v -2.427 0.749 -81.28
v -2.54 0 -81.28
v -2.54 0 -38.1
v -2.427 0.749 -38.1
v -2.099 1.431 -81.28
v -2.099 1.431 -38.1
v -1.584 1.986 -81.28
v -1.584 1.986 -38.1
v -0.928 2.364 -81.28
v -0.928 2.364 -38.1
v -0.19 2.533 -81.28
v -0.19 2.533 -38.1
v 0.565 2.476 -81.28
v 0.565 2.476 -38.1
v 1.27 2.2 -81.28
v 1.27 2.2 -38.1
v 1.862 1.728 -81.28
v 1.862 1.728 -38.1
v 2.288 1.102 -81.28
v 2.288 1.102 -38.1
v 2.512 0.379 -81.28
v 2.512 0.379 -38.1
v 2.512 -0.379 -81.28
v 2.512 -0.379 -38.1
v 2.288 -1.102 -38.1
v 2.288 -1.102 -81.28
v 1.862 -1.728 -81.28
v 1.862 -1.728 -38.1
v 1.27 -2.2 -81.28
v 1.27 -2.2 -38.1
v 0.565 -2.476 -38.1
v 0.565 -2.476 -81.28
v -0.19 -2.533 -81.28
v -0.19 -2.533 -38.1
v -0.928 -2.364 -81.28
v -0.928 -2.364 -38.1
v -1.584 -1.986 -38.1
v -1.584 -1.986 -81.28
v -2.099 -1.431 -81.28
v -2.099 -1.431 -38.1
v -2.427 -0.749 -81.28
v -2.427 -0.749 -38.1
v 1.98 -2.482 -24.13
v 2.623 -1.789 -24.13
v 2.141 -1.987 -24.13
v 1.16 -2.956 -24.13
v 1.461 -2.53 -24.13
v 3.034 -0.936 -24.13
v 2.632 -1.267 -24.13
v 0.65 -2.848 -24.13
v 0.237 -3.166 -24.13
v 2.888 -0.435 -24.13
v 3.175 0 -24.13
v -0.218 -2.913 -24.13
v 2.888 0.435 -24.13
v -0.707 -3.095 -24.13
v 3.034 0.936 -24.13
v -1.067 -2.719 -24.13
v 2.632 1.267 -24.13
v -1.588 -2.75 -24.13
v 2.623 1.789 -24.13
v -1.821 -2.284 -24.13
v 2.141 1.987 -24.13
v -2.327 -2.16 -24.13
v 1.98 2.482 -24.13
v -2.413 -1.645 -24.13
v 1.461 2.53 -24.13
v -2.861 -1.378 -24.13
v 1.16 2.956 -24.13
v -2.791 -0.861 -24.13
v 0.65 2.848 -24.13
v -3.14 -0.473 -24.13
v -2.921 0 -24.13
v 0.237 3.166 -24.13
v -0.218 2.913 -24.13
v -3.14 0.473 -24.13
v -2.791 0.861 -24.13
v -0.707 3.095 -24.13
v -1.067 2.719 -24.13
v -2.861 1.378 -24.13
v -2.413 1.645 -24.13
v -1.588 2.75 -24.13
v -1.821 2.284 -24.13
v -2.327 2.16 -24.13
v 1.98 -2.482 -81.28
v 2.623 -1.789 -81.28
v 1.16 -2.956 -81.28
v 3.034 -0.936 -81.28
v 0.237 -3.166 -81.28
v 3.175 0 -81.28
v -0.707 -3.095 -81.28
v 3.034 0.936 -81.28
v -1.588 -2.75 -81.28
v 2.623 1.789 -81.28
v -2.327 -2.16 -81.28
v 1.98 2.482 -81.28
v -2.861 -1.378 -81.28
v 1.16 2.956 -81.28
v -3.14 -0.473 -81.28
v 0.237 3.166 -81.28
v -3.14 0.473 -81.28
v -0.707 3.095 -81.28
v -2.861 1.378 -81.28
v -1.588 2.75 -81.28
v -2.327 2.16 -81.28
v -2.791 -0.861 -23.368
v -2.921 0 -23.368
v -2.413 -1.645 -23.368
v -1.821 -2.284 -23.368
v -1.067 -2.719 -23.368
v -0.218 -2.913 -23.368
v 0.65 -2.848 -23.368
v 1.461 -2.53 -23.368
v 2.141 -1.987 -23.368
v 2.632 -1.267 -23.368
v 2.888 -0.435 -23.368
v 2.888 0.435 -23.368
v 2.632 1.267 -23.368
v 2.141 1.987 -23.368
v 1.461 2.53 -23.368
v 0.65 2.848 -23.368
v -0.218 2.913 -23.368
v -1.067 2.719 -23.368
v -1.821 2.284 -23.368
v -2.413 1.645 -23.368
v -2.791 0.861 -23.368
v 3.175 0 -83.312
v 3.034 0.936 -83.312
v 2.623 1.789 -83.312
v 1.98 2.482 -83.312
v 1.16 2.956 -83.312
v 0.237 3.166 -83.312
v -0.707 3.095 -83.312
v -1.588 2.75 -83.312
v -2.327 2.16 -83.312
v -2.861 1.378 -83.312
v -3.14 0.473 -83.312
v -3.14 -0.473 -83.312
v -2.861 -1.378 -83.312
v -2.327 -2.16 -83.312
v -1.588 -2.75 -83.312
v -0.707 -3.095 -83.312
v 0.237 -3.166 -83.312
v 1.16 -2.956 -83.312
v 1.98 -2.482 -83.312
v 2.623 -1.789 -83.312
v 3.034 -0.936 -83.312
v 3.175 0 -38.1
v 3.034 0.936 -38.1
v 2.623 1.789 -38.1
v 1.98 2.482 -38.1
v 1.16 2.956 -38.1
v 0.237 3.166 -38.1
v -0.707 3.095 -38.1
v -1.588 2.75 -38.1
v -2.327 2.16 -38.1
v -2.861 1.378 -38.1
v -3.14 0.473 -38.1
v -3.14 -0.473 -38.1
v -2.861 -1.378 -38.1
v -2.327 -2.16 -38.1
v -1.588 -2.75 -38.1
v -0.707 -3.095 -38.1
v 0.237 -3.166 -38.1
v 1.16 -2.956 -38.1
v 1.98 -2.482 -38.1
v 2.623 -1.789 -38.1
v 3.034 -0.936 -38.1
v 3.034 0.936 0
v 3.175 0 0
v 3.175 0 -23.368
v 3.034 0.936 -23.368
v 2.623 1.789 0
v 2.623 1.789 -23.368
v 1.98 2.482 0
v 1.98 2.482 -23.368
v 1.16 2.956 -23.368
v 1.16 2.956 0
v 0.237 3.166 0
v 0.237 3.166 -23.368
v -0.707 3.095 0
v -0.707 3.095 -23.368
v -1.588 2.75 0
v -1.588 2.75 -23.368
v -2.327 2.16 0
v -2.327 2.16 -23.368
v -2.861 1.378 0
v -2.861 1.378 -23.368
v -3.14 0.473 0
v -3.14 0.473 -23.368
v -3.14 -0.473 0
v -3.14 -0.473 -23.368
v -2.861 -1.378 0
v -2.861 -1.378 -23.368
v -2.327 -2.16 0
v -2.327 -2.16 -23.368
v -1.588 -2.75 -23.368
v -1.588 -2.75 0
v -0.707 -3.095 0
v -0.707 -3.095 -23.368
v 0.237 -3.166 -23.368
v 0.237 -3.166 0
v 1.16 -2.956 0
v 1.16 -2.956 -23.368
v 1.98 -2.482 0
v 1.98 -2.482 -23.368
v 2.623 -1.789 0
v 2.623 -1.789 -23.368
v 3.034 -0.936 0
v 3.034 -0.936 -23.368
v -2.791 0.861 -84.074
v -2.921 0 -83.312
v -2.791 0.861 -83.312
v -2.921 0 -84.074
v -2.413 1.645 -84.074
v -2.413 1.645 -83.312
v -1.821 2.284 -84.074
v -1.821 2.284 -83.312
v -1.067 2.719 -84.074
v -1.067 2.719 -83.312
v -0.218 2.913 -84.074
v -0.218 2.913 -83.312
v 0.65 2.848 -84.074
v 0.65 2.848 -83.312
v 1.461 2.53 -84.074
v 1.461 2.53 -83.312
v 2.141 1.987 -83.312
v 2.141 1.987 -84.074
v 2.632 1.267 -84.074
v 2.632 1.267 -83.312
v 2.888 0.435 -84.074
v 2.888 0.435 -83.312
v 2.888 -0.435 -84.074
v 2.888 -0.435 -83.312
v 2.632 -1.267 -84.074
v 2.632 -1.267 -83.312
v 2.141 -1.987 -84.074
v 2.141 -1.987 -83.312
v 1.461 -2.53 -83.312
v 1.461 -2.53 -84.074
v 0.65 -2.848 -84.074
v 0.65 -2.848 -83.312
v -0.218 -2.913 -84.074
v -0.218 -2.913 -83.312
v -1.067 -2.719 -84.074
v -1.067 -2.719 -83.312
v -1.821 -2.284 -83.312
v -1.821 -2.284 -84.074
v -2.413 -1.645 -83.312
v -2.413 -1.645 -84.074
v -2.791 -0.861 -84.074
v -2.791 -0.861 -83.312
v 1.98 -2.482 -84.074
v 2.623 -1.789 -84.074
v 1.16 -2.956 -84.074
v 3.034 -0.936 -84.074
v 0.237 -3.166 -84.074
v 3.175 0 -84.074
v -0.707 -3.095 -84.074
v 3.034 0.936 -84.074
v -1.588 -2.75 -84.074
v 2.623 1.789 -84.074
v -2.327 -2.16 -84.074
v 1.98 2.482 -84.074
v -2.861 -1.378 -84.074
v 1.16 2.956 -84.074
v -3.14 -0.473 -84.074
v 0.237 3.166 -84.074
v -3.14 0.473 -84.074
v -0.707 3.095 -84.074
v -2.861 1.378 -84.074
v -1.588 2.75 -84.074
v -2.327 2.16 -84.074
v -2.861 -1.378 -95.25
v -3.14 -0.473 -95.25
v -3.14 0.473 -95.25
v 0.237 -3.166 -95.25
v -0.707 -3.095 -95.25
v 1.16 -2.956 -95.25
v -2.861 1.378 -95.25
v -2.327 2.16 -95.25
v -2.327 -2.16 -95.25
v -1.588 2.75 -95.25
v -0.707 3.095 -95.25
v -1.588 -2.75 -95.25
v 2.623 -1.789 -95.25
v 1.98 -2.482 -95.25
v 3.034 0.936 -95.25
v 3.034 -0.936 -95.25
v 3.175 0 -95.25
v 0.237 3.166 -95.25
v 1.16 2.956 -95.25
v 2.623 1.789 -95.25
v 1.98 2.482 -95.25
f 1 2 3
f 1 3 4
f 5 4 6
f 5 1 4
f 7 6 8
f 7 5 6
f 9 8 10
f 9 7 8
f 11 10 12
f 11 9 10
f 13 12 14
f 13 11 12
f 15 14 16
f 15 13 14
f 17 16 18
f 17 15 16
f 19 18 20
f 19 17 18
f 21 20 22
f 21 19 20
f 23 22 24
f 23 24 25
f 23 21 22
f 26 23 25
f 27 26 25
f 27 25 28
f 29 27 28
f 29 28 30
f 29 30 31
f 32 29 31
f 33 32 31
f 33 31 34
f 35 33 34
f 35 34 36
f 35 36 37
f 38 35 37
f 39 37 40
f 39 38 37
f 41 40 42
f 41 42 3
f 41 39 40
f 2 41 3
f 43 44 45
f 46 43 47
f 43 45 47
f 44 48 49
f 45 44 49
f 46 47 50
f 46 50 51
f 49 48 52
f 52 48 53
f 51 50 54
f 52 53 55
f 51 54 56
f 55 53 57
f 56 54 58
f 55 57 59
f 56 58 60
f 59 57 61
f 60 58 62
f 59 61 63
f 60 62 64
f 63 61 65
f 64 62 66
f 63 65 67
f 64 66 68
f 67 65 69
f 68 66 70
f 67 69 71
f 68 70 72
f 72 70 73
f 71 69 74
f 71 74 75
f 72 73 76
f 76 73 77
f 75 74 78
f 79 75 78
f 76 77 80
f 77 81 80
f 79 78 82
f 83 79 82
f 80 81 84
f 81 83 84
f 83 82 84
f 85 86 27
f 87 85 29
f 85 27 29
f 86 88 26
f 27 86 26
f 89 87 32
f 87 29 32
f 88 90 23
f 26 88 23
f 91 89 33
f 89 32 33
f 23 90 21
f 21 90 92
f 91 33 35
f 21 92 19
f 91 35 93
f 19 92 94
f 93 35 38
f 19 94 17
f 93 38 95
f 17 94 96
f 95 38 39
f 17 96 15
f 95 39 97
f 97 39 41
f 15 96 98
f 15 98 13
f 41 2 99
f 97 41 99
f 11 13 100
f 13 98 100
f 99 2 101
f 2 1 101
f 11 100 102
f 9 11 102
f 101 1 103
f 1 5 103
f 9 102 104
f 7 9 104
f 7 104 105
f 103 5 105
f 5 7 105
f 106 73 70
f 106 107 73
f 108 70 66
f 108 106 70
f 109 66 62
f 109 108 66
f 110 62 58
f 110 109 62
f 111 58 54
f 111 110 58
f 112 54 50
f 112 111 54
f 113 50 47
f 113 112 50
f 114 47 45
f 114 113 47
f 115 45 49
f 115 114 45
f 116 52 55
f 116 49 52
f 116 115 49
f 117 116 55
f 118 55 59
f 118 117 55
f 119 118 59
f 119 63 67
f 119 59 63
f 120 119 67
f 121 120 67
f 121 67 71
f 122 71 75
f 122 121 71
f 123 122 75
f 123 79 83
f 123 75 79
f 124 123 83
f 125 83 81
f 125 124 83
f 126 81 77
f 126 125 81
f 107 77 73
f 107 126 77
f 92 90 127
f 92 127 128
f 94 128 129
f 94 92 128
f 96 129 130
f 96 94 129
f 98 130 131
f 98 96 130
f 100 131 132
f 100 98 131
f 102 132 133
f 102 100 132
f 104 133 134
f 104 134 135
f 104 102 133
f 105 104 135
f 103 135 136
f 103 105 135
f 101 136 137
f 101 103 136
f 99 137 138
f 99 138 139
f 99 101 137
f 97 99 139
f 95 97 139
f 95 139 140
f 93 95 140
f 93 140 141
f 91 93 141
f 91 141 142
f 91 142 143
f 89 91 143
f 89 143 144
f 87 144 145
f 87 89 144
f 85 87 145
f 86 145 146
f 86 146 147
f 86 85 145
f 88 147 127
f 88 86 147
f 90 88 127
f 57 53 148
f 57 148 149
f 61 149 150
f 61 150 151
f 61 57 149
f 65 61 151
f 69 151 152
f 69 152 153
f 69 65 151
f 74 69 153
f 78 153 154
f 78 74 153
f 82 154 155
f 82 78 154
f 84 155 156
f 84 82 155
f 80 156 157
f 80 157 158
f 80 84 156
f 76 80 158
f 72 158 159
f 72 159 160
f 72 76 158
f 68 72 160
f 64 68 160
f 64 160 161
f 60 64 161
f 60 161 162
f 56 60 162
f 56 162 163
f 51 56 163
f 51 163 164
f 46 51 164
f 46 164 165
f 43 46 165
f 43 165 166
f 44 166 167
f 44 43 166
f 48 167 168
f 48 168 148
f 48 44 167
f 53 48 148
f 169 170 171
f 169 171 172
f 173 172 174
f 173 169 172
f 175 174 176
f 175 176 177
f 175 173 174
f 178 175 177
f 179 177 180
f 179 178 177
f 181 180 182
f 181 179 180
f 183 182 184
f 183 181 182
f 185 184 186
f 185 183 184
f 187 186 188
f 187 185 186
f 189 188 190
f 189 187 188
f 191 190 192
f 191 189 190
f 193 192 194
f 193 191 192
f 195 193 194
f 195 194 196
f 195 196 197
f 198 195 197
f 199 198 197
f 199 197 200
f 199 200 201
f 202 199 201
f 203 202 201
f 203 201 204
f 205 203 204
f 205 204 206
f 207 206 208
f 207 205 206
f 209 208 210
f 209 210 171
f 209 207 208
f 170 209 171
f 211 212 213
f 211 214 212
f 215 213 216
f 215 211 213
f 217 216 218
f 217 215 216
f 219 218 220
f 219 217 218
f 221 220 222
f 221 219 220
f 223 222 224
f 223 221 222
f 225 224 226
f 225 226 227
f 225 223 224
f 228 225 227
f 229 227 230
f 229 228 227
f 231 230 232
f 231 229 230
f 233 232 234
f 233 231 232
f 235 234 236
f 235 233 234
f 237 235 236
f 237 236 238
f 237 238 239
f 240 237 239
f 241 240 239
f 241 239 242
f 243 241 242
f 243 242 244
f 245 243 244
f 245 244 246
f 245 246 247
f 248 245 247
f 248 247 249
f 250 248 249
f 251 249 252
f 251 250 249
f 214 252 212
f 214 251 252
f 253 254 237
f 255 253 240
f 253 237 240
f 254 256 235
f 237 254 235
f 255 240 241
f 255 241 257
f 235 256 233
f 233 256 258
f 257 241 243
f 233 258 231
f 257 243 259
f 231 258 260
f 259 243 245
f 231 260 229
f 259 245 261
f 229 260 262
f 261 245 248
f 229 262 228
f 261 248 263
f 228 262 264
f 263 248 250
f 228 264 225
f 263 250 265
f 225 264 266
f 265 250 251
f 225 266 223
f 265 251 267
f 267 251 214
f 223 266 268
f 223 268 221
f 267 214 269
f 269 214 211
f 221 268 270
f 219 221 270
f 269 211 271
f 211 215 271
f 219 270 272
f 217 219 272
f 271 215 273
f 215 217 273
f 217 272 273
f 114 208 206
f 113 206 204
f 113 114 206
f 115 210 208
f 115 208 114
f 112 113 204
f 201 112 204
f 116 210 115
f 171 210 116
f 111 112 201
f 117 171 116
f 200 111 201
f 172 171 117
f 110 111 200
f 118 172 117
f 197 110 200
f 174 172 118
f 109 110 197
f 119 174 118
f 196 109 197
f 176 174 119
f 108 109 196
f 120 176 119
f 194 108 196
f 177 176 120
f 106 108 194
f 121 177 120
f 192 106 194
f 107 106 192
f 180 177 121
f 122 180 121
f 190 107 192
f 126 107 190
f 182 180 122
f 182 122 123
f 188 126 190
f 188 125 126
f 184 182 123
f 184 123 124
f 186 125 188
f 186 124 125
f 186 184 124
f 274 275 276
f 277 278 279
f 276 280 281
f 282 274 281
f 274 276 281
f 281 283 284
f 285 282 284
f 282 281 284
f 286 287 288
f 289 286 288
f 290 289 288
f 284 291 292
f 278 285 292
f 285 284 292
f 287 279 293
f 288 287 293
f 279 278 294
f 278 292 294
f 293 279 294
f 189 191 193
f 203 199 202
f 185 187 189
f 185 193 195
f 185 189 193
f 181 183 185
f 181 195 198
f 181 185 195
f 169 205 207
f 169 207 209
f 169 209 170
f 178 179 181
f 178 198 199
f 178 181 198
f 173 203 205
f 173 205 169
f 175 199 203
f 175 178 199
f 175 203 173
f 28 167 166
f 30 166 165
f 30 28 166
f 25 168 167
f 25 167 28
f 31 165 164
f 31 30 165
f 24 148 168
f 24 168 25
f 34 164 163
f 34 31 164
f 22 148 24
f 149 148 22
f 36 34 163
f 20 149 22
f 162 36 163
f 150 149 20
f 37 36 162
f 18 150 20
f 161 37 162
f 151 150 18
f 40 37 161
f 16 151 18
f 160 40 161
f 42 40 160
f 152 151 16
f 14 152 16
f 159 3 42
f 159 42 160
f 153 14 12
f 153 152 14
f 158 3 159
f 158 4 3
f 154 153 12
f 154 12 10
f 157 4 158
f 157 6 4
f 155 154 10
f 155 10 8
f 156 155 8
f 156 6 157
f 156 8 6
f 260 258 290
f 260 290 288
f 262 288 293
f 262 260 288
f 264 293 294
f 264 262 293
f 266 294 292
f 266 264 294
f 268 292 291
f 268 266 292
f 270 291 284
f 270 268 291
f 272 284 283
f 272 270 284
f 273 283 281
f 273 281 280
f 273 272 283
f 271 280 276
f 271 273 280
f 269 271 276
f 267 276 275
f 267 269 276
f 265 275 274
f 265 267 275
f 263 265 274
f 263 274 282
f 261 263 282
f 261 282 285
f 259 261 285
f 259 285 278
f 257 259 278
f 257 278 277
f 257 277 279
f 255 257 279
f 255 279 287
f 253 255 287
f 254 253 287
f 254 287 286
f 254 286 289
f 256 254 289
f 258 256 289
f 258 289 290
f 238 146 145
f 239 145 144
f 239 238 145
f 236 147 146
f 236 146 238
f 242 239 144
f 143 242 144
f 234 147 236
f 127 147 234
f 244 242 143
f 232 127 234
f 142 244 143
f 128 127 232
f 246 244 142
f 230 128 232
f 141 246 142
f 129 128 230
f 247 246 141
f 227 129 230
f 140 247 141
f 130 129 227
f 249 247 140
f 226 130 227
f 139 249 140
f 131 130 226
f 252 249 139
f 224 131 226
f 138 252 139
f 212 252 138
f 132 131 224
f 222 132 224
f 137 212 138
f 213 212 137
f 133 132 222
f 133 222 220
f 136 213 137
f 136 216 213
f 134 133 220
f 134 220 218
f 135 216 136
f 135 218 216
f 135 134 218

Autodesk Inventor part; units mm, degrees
ref_plane "YZ Plane" through (0, 0, 0) normal (1, 0, 0) x (0, 1, 0)
ref_plane "XY Plane" through (0, 0, 0) normal (0, 0, 1) x (1, 0, 0)
sketch "Sketch1" plane through (0, 0, 0) normal (0, 0, 1) x (1, 0, 0)
  circle A0 centre (0, 0) radius 3.175
  dimension "d0" = 6.35
extrude "Extrusion1" add sketch "Sketch1" against normal blind 95.25
ref_plane "Work Plane5" through (0, 0, -81.28) normal (0, 0, -1) x (-1, 0, 0)
sketch "Sketch6" plane through (0, 0, -81.28) normal (0, 0, -1) x (-1, 0, 0)
  circle A0 centre (0, 0) radius 2.54
  circle A1 centre (0, 0) radius 3.175
  dimension "d11" = 5.08
  dimension "d12" = 6.35
extrude "Extrusion4" cut sketch "Sketch6" against normal blind 43.18
ref_plane "Work Plane6" through (0, 0, -84.074) normal (0, 0, -1) x (-1, 0, 0)
sketch "Sketch7" plane through (0, 0, -84.074) normal (0, 0, -1) x (-1, 0, 0)
  circle A0 centre (0, 0) radius 3.175
  circle A1 centre (0, 0) radius 2.921
  dimension "d16" = 6.35
  dimension "d17" = 5.842
extrude "Extrusion5" cut sketch "Sketch7" against normal blind 0.762
ref_plane "Work Plane7" through (0, 0, -23.368) normal (0, 0, -1) x (-1, 0, 0)
sketch "Sketch8" plane through (0, 0, -23.368) normal (0, 0, -1) x (-1, 0, 0)
  circle A0 centre (0, 0) radius 3.175
  circle A1 centre (0, 0) radius 2.921
  dimension "d21" = 6.35
  dimension "d22" = 5.842
extrude "Extrusion6" cut sketch "Sketch8" along normal blind 0.762
properties part number "ShaftStraight" material "Aluminum-6061"
